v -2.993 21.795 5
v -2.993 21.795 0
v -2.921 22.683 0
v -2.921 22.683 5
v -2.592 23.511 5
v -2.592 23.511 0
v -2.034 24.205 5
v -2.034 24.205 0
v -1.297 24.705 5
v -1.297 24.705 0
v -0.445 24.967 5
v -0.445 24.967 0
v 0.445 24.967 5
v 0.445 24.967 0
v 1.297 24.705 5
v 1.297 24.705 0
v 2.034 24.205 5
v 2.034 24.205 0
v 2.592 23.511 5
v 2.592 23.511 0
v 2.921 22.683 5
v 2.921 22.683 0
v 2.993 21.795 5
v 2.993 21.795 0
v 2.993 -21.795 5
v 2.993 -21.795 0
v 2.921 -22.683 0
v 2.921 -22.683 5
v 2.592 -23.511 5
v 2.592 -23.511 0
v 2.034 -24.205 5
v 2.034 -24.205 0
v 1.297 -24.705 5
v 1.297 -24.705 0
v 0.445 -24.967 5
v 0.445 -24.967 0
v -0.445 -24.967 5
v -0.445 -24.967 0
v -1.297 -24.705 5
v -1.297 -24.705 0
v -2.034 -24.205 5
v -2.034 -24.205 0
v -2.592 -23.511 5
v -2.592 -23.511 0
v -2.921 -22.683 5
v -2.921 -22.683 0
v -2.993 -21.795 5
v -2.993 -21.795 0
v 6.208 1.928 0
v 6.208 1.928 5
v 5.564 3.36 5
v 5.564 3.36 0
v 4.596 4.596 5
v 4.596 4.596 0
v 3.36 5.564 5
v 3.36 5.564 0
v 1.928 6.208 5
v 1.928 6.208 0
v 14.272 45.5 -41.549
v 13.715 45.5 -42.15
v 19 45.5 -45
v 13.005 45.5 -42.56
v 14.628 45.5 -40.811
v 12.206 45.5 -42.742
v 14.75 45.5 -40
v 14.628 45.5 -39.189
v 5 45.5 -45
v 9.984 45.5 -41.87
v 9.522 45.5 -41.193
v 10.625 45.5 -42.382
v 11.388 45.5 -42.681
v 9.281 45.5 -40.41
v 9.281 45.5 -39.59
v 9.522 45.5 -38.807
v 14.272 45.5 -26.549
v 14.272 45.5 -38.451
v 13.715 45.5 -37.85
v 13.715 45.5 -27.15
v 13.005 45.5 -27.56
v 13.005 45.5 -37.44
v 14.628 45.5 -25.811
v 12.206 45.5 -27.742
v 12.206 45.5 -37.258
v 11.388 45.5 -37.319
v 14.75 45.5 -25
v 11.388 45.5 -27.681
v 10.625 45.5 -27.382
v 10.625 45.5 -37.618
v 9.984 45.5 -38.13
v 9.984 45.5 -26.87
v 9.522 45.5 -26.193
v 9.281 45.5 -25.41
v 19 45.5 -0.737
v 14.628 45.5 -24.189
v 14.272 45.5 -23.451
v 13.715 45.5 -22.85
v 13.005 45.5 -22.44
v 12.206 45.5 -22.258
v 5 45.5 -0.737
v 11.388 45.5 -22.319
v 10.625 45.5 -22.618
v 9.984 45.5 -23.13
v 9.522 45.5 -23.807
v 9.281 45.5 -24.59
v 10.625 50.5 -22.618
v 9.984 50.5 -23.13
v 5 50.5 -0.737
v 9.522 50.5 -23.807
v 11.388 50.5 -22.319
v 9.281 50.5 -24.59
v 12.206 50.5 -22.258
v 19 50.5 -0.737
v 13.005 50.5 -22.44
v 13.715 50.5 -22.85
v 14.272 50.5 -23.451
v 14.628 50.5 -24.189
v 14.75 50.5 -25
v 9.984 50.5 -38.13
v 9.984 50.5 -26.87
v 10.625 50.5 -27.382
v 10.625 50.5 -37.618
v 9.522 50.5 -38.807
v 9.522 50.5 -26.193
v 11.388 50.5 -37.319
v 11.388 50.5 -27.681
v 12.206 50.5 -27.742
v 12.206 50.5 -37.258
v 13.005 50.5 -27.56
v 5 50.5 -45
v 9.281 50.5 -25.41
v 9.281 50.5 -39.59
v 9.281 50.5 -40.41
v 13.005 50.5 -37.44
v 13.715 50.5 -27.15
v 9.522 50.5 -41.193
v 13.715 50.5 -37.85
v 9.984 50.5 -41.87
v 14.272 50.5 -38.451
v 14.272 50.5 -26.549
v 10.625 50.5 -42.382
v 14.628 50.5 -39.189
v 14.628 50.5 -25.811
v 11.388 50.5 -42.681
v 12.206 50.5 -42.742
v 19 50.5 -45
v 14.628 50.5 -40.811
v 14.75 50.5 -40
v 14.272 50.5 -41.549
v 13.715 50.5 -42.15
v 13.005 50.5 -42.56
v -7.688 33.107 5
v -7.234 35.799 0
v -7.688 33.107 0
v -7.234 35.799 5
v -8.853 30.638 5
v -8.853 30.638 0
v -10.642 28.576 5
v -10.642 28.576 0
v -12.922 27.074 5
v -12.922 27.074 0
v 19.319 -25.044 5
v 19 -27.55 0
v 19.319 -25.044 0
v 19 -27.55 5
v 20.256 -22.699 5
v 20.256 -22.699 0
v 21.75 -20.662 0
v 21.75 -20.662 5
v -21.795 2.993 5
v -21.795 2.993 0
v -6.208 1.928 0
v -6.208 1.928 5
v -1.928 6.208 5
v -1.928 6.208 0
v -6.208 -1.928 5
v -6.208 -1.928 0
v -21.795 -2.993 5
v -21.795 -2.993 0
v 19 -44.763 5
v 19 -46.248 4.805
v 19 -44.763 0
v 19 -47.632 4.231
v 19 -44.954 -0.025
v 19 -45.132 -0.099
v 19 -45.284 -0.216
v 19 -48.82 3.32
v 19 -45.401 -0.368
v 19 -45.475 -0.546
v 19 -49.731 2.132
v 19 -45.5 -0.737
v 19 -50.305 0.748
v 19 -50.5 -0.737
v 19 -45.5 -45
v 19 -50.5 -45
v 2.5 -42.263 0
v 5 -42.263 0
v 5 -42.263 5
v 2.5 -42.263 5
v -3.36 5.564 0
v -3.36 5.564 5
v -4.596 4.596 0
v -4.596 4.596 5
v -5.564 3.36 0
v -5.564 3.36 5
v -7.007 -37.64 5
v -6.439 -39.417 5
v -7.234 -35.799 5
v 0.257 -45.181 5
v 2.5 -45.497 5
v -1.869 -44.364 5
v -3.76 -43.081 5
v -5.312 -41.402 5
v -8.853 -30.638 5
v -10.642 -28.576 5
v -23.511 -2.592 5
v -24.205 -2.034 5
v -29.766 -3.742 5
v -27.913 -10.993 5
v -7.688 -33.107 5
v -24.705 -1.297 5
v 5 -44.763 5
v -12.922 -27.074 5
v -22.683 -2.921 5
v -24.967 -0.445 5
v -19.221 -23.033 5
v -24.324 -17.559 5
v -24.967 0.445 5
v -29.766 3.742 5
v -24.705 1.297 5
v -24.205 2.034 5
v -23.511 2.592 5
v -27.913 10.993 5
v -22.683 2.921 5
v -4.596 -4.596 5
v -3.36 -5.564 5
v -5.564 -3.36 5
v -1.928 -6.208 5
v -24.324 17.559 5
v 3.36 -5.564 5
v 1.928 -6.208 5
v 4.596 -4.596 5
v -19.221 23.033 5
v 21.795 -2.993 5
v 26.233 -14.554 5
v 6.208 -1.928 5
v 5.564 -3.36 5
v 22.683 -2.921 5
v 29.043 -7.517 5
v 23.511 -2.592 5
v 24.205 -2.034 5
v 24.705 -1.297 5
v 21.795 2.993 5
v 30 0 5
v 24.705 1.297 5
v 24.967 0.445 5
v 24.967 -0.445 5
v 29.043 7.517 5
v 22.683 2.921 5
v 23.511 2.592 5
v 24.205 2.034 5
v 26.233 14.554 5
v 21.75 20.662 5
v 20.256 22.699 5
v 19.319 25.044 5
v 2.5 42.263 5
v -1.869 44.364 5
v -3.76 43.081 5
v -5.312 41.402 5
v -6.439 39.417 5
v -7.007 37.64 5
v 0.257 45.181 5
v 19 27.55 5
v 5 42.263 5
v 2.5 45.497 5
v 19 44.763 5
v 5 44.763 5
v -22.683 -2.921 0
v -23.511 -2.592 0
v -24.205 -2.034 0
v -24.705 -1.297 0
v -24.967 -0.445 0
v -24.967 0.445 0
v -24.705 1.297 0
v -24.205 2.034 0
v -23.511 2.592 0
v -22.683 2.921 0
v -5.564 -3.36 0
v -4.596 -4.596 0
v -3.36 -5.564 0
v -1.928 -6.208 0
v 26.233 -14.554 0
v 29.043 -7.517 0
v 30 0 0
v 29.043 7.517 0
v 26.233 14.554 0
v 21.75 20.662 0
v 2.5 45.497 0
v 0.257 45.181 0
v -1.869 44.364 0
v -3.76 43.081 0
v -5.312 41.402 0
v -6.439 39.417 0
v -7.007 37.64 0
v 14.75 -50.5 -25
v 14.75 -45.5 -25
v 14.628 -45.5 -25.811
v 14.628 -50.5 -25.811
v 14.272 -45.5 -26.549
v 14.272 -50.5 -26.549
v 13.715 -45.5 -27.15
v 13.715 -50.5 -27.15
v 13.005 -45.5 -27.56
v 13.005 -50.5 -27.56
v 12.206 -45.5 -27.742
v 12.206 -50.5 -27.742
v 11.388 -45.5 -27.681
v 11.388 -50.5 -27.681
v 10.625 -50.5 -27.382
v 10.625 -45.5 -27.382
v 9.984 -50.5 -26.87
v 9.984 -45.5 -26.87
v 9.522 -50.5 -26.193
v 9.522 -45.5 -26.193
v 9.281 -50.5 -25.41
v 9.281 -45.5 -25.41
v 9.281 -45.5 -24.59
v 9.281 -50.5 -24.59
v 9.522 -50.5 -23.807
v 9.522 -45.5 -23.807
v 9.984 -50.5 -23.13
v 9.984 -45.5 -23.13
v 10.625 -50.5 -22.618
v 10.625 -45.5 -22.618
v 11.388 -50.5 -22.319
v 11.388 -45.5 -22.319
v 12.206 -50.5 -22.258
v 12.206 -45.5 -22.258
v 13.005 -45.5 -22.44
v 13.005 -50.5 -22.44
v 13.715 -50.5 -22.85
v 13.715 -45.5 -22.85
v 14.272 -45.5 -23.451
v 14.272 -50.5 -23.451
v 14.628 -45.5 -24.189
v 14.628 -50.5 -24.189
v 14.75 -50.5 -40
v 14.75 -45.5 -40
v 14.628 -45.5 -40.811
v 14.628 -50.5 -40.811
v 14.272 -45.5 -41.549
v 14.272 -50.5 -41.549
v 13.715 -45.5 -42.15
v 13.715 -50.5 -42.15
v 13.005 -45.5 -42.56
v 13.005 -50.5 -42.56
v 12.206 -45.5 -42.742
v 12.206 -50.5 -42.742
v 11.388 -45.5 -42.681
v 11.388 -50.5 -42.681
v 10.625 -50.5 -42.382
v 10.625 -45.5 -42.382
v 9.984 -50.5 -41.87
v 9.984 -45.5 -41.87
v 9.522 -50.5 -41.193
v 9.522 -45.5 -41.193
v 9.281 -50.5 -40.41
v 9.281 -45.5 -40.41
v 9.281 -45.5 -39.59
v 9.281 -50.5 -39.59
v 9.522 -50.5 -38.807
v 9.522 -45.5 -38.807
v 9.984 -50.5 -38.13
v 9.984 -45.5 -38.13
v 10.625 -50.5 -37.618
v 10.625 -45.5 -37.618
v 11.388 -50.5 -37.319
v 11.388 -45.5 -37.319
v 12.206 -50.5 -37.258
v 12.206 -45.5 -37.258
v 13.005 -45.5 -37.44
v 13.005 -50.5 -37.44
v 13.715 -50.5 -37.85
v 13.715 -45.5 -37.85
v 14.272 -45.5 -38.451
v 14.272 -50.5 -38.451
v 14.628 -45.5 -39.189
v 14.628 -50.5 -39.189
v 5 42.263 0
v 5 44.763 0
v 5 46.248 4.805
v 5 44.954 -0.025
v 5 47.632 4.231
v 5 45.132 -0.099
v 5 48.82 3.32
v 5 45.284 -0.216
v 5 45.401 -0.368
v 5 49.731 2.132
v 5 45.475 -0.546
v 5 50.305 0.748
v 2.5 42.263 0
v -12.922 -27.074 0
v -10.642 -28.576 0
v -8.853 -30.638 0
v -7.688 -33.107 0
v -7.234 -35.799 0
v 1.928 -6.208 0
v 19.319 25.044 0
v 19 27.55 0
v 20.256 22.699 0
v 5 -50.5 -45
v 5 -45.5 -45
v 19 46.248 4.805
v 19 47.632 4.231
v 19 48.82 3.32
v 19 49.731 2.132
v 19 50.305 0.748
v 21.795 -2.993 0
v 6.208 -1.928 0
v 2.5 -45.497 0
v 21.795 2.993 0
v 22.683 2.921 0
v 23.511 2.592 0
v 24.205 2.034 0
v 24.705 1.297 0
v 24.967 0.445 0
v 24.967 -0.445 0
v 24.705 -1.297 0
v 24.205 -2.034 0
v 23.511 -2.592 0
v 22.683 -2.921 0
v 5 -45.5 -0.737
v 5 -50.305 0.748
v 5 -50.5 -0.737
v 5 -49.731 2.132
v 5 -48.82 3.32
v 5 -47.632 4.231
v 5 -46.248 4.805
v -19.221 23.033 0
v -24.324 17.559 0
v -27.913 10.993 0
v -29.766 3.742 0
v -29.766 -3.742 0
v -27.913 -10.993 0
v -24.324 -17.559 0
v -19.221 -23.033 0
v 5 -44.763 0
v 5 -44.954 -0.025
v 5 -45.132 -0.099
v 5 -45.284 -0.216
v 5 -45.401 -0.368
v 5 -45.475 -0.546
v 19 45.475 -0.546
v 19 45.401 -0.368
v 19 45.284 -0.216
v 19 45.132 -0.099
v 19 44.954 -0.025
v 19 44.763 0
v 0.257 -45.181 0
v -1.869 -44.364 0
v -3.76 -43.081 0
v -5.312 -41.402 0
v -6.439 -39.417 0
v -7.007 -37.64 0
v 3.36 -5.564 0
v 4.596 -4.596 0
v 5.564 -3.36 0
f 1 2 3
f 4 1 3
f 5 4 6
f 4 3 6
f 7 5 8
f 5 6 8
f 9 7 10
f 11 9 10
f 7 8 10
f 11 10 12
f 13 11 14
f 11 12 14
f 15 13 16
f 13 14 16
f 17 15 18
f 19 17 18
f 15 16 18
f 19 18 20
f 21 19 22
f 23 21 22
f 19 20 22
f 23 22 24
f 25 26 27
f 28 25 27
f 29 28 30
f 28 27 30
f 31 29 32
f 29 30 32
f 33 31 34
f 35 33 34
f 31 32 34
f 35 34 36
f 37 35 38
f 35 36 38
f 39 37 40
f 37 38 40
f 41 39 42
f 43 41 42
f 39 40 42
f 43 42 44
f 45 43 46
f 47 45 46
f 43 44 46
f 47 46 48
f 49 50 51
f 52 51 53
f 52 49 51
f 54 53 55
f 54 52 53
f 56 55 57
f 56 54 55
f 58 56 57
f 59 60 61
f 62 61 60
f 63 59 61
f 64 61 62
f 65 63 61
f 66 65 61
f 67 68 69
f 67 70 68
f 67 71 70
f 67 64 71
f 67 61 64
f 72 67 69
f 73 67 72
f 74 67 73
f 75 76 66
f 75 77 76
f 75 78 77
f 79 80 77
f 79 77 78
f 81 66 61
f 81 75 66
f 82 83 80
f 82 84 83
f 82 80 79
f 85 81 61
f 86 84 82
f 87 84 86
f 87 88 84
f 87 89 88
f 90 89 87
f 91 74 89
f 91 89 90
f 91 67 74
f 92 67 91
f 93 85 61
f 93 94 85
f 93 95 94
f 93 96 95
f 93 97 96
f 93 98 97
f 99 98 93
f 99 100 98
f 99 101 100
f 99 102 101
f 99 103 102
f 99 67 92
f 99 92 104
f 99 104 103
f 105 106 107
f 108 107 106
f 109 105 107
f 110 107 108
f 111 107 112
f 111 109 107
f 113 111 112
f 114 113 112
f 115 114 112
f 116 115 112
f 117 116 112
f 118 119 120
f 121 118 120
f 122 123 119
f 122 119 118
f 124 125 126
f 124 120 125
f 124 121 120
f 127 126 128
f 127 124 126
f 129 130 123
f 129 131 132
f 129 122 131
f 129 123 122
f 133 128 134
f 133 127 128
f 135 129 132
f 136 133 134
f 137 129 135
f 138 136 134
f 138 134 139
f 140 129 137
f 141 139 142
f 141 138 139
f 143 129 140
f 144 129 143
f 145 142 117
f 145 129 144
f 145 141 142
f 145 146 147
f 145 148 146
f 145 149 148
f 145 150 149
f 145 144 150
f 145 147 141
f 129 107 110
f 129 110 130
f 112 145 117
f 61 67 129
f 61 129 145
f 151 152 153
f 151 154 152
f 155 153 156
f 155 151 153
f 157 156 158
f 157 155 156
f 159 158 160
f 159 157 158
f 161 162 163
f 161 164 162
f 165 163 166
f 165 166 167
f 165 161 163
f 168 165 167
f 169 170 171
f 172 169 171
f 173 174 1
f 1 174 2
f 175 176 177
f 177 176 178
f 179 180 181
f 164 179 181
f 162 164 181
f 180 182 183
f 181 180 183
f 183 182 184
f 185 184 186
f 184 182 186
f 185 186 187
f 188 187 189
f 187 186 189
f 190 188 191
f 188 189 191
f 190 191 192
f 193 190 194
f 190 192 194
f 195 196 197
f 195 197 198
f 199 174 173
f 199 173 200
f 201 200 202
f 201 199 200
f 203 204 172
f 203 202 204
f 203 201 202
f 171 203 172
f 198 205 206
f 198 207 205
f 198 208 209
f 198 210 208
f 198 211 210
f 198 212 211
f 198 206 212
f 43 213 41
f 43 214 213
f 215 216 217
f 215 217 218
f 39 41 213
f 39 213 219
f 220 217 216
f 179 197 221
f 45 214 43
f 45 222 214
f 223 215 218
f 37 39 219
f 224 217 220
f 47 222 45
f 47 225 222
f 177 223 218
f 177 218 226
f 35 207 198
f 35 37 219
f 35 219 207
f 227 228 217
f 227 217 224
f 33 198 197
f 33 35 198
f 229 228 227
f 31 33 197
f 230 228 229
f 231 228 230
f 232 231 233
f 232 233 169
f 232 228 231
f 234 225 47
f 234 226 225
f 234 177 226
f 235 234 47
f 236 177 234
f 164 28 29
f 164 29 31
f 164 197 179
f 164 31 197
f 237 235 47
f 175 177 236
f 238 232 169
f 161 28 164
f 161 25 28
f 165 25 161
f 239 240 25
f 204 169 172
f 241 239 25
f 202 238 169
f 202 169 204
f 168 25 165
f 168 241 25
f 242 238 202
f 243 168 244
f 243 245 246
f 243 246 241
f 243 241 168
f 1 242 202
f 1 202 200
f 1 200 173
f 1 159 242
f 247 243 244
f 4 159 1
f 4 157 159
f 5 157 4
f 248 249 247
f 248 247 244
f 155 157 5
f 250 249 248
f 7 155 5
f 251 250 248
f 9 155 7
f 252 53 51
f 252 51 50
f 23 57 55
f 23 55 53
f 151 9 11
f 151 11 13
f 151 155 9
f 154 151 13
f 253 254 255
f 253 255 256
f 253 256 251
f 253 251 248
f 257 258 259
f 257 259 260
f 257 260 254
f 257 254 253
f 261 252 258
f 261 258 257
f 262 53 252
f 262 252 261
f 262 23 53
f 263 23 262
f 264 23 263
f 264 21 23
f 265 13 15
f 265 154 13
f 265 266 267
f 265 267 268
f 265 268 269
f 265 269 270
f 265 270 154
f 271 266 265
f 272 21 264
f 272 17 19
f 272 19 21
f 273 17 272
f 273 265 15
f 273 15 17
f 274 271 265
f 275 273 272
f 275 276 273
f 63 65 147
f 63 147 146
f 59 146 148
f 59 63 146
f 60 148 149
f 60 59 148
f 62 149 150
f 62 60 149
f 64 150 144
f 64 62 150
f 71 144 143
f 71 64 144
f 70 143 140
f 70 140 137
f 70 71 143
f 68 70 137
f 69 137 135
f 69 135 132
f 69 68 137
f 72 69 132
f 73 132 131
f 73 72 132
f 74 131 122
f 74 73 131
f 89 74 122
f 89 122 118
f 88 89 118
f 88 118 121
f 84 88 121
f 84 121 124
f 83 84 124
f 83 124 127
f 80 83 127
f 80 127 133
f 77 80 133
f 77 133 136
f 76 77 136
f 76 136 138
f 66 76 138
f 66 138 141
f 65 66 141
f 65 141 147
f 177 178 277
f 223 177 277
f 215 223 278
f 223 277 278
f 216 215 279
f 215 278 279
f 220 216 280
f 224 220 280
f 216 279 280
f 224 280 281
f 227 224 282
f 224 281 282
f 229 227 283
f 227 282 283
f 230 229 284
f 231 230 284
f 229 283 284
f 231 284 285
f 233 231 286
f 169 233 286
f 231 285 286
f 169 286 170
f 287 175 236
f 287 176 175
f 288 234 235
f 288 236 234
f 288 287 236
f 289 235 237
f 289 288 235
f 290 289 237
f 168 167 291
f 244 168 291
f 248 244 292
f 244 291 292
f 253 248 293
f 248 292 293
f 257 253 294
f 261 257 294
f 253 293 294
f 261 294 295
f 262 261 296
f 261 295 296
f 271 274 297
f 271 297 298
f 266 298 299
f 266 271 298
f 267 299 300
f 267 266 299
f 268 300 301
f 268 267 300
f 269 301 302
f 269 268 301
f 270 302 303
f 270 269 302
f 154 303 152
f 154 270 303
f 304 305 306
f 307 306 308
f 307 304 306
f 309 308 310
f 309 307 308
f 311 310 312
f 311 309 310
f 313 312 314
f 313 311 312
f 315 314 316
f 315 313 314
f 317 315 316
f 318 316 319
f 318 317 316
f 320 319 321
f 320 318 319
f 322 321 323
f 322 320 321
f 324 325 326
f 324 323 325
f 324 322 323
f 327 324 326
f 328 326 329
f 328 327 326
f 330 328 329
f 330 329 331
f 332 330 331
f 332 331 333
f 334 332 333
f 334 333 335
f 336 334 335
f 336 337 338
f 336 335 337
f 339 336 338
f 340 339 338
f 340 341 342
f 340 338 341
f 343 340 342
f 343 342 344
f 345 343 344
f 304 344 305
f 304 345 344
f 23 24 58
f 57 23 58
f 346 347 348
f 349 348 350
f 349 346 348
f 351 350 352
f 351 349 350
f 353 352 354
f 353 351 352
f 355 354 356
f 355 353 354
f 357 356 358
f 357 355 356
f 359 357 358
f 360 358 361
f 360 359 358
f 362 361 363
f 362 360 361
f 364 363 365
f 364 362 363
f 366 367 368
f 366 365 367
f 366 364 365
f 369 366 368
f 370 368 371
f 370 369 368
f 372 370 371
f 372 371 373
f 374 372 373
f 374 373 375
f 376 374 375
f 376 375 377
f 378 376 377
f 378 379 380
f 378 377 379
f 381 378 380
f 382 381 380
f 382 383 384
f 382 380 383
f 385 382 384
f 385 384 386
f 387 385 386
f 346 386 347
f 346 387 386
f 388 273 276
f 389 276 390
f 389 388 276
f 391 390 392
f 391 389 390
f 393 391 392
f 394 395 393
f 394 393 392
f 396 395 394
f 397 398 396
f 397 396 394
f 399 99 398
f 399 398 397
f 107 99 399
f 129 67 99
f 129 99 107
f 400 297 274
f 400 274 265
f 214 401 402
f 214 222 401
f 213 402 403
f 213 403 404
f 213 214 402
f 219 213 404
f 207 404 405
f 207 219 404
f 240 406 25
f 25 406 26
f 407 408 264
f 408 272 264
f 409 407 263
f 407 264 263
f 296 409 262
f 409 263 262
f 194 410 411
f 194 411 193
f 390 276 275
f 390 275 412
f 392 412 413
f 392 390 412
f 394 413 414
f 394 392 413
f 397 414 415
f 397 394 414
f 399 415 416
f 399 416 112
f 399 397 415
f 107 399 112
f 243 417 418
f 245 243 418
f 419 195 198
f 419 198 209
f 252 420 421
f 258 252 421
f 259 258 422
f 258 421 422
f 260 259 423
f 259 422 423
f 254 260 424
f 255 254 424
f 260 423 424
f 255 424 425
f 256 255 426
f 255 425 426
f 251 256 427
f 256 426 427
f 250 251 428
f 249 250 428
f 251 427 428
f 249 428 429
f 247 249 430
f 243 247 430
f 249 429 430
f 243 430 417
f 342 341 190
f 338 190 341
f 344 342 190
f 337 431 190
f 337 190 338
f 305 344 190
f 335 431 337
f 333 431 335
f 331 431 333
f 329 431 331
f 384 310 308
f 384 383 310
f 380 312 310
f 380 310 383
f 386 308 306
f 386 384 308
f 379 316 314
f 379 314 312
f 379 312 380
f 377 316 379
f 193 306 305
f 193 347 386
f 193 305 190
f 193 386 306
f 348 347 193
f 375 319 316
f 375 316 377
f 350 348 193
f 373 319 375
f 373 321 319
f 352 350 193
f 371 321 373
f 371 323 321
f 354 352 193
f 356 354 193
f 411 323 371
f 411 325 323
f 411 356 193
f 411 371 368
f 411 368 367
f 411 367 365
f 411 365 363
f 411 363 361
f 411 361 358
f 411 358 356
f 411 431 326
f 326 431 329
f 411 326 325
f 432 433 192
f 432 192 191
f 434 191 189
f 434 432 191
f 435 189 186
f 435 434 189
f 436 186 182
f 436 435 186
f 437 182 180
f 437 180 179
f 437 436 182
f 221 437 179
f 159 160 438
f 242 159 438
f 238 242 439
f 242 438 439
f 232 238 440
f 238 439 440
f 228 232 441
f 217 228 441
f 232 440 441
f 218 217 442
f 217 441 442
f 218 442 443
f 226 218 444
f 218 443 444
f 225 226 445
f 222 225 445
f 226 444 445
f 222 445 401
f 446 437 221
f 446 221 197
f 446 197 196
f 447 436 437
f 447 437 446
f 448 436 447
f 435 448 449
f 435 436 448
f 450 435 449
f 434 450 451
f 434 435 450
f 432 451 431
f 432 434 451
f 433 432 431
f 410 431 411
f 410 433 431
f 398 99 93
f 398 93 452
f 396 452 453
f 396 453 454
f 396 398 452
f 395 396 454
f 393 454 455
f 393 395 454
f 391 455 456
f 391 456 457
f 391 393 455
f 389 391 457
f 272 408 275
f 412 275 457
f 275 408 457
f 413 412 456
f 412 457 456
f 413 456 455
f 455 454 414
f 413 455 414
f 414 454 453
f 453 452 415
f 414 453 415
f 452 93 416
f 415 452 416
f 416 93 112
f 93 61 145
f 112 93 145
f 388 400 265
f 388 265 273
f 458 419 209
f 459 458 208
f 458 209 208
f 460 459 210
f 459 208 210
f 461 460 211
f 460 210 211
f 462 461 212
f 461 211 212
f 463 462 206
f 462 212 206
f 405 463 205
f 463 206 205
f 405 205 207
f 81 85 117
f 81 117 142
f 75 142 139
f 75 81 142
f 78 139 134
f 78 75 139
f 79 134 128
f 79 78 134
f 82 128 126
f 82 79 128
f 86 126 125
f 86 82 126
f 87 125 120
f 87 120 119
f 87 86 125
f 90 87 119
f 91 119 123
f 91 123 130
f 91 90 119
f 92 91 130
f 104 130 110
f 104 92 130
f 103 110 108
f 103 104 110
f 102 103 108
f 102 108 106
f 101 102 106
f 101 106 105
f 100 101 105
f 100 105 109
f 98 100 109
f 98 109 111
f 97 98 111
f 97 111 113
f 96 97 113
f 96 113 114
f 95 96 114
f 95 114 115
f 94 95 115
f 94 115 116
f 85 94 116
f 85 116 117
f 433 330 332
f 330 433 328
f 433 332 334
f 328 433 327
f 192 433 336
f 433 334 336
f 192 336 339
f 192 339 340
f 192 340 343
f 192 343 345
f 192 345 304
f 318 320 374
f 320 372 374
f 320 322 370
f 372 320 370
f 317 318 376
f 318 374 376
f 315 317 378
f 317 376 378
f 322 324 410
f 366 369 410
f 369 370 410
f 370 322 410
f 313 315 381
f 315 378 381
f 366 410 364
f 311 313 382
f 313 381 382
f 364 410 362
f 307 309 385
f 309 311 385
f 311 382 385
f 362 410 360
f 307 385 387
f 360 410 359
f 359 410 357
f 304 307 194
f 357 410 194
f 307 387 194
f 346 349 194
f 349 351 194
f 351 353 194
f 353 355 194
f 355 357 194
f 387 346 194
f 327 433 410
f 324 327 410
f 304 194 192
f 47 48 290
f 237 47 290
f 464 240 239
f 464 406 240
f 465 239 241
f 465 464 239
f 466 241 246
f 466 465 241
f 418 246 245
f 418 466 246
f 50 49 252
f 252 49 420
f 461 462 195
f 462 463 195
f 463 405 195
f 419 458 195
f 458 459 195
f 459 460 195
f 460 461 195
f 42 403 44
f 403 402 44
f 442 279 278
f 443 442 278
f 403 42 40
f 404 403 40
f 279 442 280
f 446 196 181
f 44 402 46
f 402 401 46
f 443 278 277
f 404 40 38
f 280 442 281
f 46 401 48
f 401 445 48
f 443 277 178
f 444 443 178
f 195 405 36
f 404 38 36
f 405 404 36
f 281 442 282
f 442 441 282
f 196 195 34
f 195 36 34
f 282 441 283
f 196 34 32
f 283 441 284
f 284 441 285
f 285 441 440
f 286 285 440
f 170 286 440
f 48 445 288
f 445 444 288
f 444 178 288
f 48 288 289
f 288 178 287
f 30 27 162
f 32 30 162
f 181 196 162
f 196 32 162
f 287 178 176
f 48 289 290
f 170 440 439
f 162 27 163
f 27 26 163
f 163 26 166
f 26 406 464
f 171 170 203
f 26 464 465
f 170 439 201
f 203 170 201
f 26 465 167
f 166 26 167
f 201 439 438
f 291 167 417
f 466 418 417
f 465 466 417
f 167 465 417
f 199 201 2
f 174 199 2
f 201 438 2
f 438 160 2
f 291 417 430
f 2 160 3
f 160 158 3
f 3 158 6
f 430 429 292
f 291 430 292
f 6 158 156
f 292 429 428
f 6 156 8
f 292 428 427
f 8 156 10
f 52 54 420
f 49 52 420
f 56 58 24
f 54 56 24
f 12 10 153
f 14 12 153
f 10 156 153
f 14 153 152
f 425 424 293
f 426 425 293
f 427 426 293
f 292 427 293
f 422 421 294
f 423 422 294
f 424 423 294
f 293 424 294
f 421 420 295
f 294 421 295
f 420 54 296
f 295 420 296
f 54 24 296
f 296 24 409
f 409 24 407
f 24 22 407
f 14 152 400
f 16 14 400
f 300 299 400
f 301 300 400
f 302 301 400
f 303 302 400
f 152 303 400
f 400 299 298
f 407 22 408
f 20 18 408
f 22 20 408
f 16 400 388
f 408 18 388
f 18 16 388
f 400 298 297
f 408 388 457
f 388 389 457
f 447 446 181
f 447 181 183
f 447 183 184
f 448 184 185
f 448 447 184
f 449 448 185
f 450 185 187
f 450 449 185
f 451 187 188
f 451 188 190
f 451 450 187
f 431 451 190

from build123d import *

# Parameters (mm, degrees)
SKETCH1_R                  = 6.5
BOSS_EXTRUDE1_DEPTH        = 5
SKETCH2_W                  = 14
SKETCH2_H                  = 5
BOSS_EXTRUDE2_DEPTH        = 50
SKETCH3_R                  = 2.75
CUT_EXTRUDE1_DEPTH         = 115
FILLET2_R                  = 10
CUT_EXTRUDE2_DEPTH         = 74.994932259
CIRPATTERN1_COUNT          = 4
BOSS_EXTRUDE5_START        = -5
BOSS_EXTRUDE5_DEPTH        = 5
FILLET5_R                  = 10
FILLET6_R                  = 10
FLATTEN_BENDS6_START       = -45
FLATTEN_BENDS6_OUTLINE_W   = 14
FLATTEN_BENDS6_OUTLINE_H   = 5
FLATTEN_BENDS6_DEPTH       = 45
FLATTEN_BENDS6_2_DEPTH     = 5
FLATTEN_BENDS6_3_OUTLINE_W = 14
FLATTEN_BENDS6_3_OUTLINE_H = 43.610839391
FLATTEN_BENDS6_3_OUTLINE_R = 2.75
FLATTEN_BENDS6_3_DEPTH     = 5
PROCESS_BENDS6_START       = -94.110839391
PROCESS_BENDS6_OUTLINE_W   = 14
PROCESS_BENDS6_OUTLINE_H   = 5
PROCESS_BENDS6_DEPTH       = 43.610839391
PROCESS_BENDS6_START_2     = 50.5
PROCESS_BENDS6_2_OUTLINE_W = 14
PROCESS_BENDS6_2_OUTLINE_H = 5
PROCESS_BENDS6_2_DEPTH     = 43.610839391
PROCESS_BENDS6_START_3     = -49.958579692
PROCESS_BENDS6_3_OUTLINE_W = 14
PROCESS_BENDS6_3_OUTLINE_H = 45
PROCESS_BENDS6_3_OUTLINE_R = 2.75
PROCESS_BENDS6_3_DEPTH     = 4.458579692
PROCESS_BENDS6_START_4     = 45.5
PROCESS_BENDS6_4_OUTLINE_W = 14
PROCESS_BENDS6_4_OUTLINE_H = 45
PROCESS_BENDS6_4_OUTLINE_R = 2.75
PROCESS_BENDS6_4_DEPTH     = 4.394100308
PROCESS_BENDS6_START_5     = 44.7634
PROCESS_BENDS6_5_OUTLINE_W = 14
PROCESS_BENDS6_5_OUTLINE_H = 45
PROCESS_BENDS6_5_OUTLINE_R = 2.75
PROCESS_BENDS6_5_DEPTH     = 5.7366
PROCESS_BENDS6_START_6     = -50.5
PROCESS_BENDS6_6_OUTLINE_W = 14
PROCESS_BENDS6_6_OUTLINE_H = 45
PROCESS_BENDS6_6_OUTLINE_R = 2.75
PROCESS_BENDS6_6_DEPTH     = 5.7366
PROCESS_BENDS6_START_7     = 5
PROCESS_BENDS6_7_DEPTH     = 14


with BuildPart() as part:
    # Sketch1 → Boss-Extrude1 (new body)
    with BuildSketch(Plane.XY):
        with BuildLine():
            Line((7.22970639, 29.115826375), (7.22970639, 45.5))
            Line((7.22970639, 45.5), (-7.22970639, 45.5))
            Line((-7.22970639, 45.5), (-7.22970639, 29.115826375))
            ThreePointArc((-7.22970639, 29.115826375), (-30, 0), (-7.22970639, -29.115826375))
            Line((-7.22970639, -29.115826375), (-7.22970639, -45.5))
            Line((-7.22970639, -45.5), (7.22970639, -45.5))
            Line((7.22970639, -45.5), (7.22970639, -29.115826375))
            ThreePointArc((7.22970639, -29.115826375), (30, 0), (7.22970639, 29.115826375))
        make_face()
        Circle(SKETCH1_R, mode=Mode.SUBTRACT)
    extrude(amount=BOSS_EXTRUDE1_DEPTH)

    # Sketch2 → Boss-Extrude2 (add)
    with BuildSketch(Plane.XY.offset(5)):
        with Locations((12, 48)):
            Rectangle(SKETCH2_W, SKETCH2_H)
        with Locations((12, -48)):
            Rectangle(SKETCH2_W, SKETCH2_H)
    extrude(amount=-BOSS_EXTRUDE2_DEPTH)

    # Sketch3 → Cut-Extrude1 (cut)
    with BuildSketch(Plane(origin=(0, 50.5, 0), x_dir=(1, 0, 0), z_dir=(0, 1, 0))):
        with Locations(Location((12, 40, 0), (0, 0, 270))):
            Circle(SKETCH3_R)
        with Locations(Location((12, 25, 0), (0, 0, 270))):
            Circle(SKETCH3_R)
    extrude(amount=-CUT_EXTRUDE1_DEPTH, mode=Mode.SUBTRACT)

    # Fillet2
    fillet2_edges = [part.edges().sort_by_distance(p)[0] for p in [
        (7.22970639, -29.115826375, 2.5),
        (-7.22970639, -29.115826375, 2.5),
        (-7.22970639, 29.115826375, 2.5),
        (7.22970639, 29.115826375, 2.5),
    ]]
    fillet(fillet2_edges, radius=FILLET2_R)

    # Sketch4 → Cut-Extrude2 (cut, through all)
    with BuildSketch(Plane(origin=(0, 0, 0), x_dir=(-1, 0, 0), z_dir=(0, 0, -1))):
        with BuildLine():
            Line((-2.993018736, 21.795454545), (-1.496509368, -0.102272727))
            ThreePointArc((-1.496509368, -0.102272727), (0, -1.5), (1.496509368, -0.102272727))
            Line((1.496509368, -0.102272727), (2.993018736, 21.795454545))
            ThreePointArc((2.993018736, 21.795454545), (0, 25), (-2.993018736, 21.795454545))
        make_face()
    cut_extrude2 = extrude(amount=-CUT_EXTRUDE2_DEPTH, mode=Mode.SUBTRACT)

    # CirPattern1: Cut-Extrude2 ×4 about axis
    cirpattern1_axis = Axis((0, 0, 0), (0, 0, 1))
    for i in range(1, CIRPATTERN1_COUNT):
        add(cut_extrude2.rotate(cirpattern1_axis, i * 360 / CIRPATTERN1_COUNT), mode=Mode.SUBTRACT)

    # Sketch41 → Boss-Extrude5 (add)
    with BuildSketch(Plane.XY.offset(5).offset(BOSS_EXTRUDE5_START)):
        with BuildLine():
            Line((7.22970639, 45.5), (19, 45.5))
            Line((19, 45.5), (19, 23.216373532))
            ThreePointArc((19, 23.216373532), (16.077275199, 25.32826923), (12.922279793, 27.074243941))
            ThreePointArc((12.922279793, 27.074243941), (8.771743693, 30.763931751), (7.22970639, 36.098991921))
            Line((7.22970639, 36.098991921), (7.22970639, 45.5))
        make_face()
        with BuildLine():
            Line((19, -45.5), (7.22970639, -45.5))
            Line((7.22970639, -45.5), (7.22970639, -36.098991921))
            ThreePointArc((7.22970639, -36.098991921), (8.771743693, -30.763931751), (12.922279793, -27.074243941))
            ThreePointArc((12.922279793, -27.074243941), (16.077275199, -25.32826923), (19, -23.216373532))
            Line((19, -23.216373532), (19, -45.5))
        make_face()
    extrude(amount=BOSS_EXTRUDE5_DEPTH)

    # Fillet5
    fillet5_edges = [part.edges().sort_by_distance(p)[0] for p in [
        (19, 23.216373532, 2.5),
        (19, -23.216373532, 2.5),
    ]]
    fillet(fillet5_edges, radius=FILLET5_R)

    # Fillet6
    fillet6_edges = [part.edges().sort_by_distance(p)[0] for p in [
        (-7.22970639, 45.5, 2.5),
        (-7.22970639, -45.5, 2.5),
    ]]
    fillet(fillet6_edges, radius=FILLET6_R)

    # Flatten-Bends6: read off the stored shape, not the designer's step
    # Flatten-Bends6 outline → Flatten-Bends6 (cut)
    with BuildSketch(Plane.XY.offset(FLATTEN_BENDS6_START)):
        with Locations((12, 48)):
            Rectangle(FLATTEN_BENDS6_OUTLINE_W, FLATTEN_BENDS6_OUTLINE_H)
        with Locations((12, -48)):
            Rectangle(FLATTEN_BENDS6_OUTLINE_W, FLATTEN_BENDS6_OUTLINE_H)
    extrude(amount=FLATTEN_BENDS6_DEPTH, mode=Mode.SUBTRACT)

    # Flatten-Bends6 2 outline → Flatten-Bends6 2 (cut)
    with BuildSketch(Plane.XY):
        with BuildLine():
            Line((5, 42.2634), (5, 45.5))
            Line((5, 45.5), (2.761321814, 45.5))
            ThreePointArc((2.761321814, 45.5), (2.63064975, 45.499146204), (2.5, 45.496584962))
            Line((2.5, 45.496584962), (2.5, 42.2634))
            Line((2.5, 42.2634), (5, 42.2634))
        make_face()
        with BuildLine():
            Line((5, -45.5), (5, -42.2634))
            Line((5, -42.2634), (2.5, -42.2634))
            Line((2.5, -42.2634), (2.5, -45.496584962))
            ThreePointArc((2.5, -45.496584962), (2.63064975, -45.499146204), (2.761321814, -45.5))
            Line((2.761321814, -45.5), (5, -45.5))
        make_face()
    extrude(amount=FLATTEN_BENDS6_2_DEPTH, mode=Mode.SUBTRACT)

    # Flatten-Bends6 3 outline → Flatten-Bends6 3 (add)
    # profile 1 of 2: a face of its own
    with BuildSketch(Plane.XY):
        with Locations((12, 72.305419696)):
            Rectangle(FLATTEN_BENDS6_3_OUTLINE_W, FLATTEN_BENDS6_3_OUTLINE_H)
        with Locations((12, 74.110839391)):
            Circle(FLATTEN_BENDS6_3_OUTLINE_R, mode=Mode.SUBTRACT)
        with Locations((12, 89.110839391)):
            Circle(FLATTEN_BENDS6_3_OUTLINE_R, mode=Mode.SUBTRACT)
    # profile 2 of 2: a face of its own
    with BuildSketch(Plane.XY):
        with Locations((12, -72.305419696)):
            Rectangle(FLATTEN_BENDS6_3_OUTLINE_W, FLATTEN_BENDS6_3_OUTLINE_H)
        with Locations((12, -89.110839391)):
            Circle(FLATTEN_BENDS6_3_OUTLINE_R, mode=Mode.SUBTRACT)
        with Locations((12, -74.110839391)):
            Circle(FLATTEN_BENDS6_3_OUTLINE_R, mode=Mode.SUBTRACT)
    extrude(amount=FLATTEN_BENDS6_3_DEPTH)

    # Process-Bends6: read off the stored shape, not the designer's step
    # Process-Bends6 outline → Process-Bends6 (cut)
    with BuildSketch(Plane(origin=(0, 0, 0), x_dir=(1, 0, 0), z_dir=(0, 1, 0)).offset(PROCESS_BENDS6_START)):
        with Locations((12, -2.5)):
            Rectangle(PROCESS_BENDS6_OUTLINE_W, PROCESS_BENDS6_OUTLINE_H)
    extrude(amount=PROCESS_BENDS6_DEPTH, mode=Mode.SUBTRACT)

    # Process-Bends6 2 outline → Process-Bends6 2 (cut)
    with BuildSketch(Plane(origin=(0, 0, 0), x_dir=(1, 0, 0), z_dir=(0, 1, 0)).offset(PROCESS_BENDS6_START_2)):
        with Locations((12, -2.5)):
            Rectangle(PROCESS_BENDS6_2_OUTLINE_W, PROCESS_BENDS6_2_OUTLINE_H)
    extrude(amount=PROCESS_BENDS6_2_DEPTH, mode=Mode.SUBTRACT)

    # Process-Bends6 3 outline → Process-Bends6 3 (add)
    with BuildSketch(Plane(origin=(0, 0, 0), x_dir=(1, 0, 0), z_dir=(0, 1, 0)).offset(PROCESS_BENDS6_START_3)):
        with Locations((12, 22.5)):
            Rectangle(PROCESS_BENDS6_3_OUTLINE_W, PROCESS_BENDS6_3_OUTLINE_H)
        with Locations((12, 25)):
            Circle(PROCESS_BENDS6_3_OUTLINE_R, mode=Mode.SUBTRACT)
        with Locations((12, 40)):
            Circle(PROCESS_BENDS6_3_OUTLINE_R, mode=Mode.SUBTRACT)
    extrude(amount=PROCESS_BENDS6_3_DEPTH)

    # Process-Bends6 4 outline → Process-Bends6 4 (add)
    with BuildSketch(Plane(origin=(0, 0, 0), x_dir=(1, 0, 0), z_dir=(0, 1, 0)).offset(PROCESS_BENDS6_START_4)):
        with Locations((12, 22.5)):
            Rectangle(PROCESS_BENDS6_4_OUTLINE_W, PROCESS_BENDS6_4_OUTLINE_H)
        with Locations((12, 25)):
            Circle(PROCESS_BENDS6_4_OUTLINE_R, mode=Mode.SUBTRACT)
        with Locations((12, 40)):
            Circle(PROCESS_BENDS6_4_OUTLINE_R, mode=Mode.SUBTRACT)
    extrude(amount=PROCESS_BENDS6_4_DEPTH)

    # Process-Bends6 5 outline → Process-Bends6 5 (add)
    with BuildSketch(Plane(origin=(0, 0, 0), x_dir=(1, 0, 0), z_dir=(0, 1, 0)).offset(PROCESS_BENDS6_START_5)):
        with Locations((12, 22.5)):
            Rectangle(PROCESS_BENDS6_5_OUTLINE_W, PROCESS_BENDS6_5_OUTLINE_H)
        with Locations((12, 25)):
            Circle(PROCESS_BENDS6_5_OUTLINE_R, mode=Mode.SUBTRACT)
        with Locations((12, 40)):
            Circle(PROCESS_BENDS6_5_OUTLINE_R, mode=Mode.SUBTRACT)
    extrude(amount=PROCESS_BENDS6_5_DEPTH)

    # Process-Bends6 6 outline → Process-Bends6 6 (add)
    with BuildSketch(Plane(origin=(0, 0, 0), x_dir=(1, 0, 0), z_dir=(0, 1, 0)).offset(PROCESS_BENDS6_START_6)):
        with Locations((12, 22.5)):
            Rectangle(PROCESS_BENDS6_6_OUTLINE_W, PROCESS_BENDS6_6_OUTLINE_H)
        with Locations((12, 25)):
            Circle(PROCESS_BENDS6_6_OUTLINE_R, mode=Mode.SUBTRACT)
        with Locations((12, 40)):
            Circle(PROCESS_BENDS6_6_OUTLINE_R, mode=Mode.SUBTRACT)
    extrude(amount=PROCESS_BENDS6_6_DEPTH)

    # Process-Bends6 7 outline → Process-Bends6 7 (cut)
    with BuildSketch(Plane.YZ.offset(PROCESS_BENDS6_START_7)):
        with BuildLine():
            Line((-45.5, -0.7366), (-45.5, -45))
            Line((-45.5, -45), (-44.7634, -45))
            Line((-44.7634, -45), (-44.7634, 0))
            ThreePointArc((-44.7634, 0), (-45.284254855, -0.215745145), (-45.5, -0.7366))
        make_face()
        with BuildLine():
            ThreePointArc((-50.5, -0.7366), (-48.819788761, 3.319788761), (-44.7634, 5))
            Line((-44.7634, 5), (-50.5, 5))
            Line((-50.5, 5), (-50.5, -0.7366))
        make_face()
        with BuildLine():
            ThreePointArc((44.7634, 5), (48.819788761, 3.319788761), (50.5, -0.7366))
            Line((50.5, -0.7366), (50.5, 5))
            Line((50.5, 5), (44.7634, 5))
        make_face()
        with BuildLine():
            Line((45.5, -45), (45.5, -0.7366))
            ThreePointArc((45.5, -0.7366), (45.284254855, -0.215745145), (44.7634, 0))
            Line((44.7634, 0), (44.7634, -45))
            Line((44.7634, -45), (45.5, -45))
        make_face()
    extrude(amount=PROCESS_BENDS6_7_DEPTH, mode=Mode.SUBTRACT)


solid = part.part
